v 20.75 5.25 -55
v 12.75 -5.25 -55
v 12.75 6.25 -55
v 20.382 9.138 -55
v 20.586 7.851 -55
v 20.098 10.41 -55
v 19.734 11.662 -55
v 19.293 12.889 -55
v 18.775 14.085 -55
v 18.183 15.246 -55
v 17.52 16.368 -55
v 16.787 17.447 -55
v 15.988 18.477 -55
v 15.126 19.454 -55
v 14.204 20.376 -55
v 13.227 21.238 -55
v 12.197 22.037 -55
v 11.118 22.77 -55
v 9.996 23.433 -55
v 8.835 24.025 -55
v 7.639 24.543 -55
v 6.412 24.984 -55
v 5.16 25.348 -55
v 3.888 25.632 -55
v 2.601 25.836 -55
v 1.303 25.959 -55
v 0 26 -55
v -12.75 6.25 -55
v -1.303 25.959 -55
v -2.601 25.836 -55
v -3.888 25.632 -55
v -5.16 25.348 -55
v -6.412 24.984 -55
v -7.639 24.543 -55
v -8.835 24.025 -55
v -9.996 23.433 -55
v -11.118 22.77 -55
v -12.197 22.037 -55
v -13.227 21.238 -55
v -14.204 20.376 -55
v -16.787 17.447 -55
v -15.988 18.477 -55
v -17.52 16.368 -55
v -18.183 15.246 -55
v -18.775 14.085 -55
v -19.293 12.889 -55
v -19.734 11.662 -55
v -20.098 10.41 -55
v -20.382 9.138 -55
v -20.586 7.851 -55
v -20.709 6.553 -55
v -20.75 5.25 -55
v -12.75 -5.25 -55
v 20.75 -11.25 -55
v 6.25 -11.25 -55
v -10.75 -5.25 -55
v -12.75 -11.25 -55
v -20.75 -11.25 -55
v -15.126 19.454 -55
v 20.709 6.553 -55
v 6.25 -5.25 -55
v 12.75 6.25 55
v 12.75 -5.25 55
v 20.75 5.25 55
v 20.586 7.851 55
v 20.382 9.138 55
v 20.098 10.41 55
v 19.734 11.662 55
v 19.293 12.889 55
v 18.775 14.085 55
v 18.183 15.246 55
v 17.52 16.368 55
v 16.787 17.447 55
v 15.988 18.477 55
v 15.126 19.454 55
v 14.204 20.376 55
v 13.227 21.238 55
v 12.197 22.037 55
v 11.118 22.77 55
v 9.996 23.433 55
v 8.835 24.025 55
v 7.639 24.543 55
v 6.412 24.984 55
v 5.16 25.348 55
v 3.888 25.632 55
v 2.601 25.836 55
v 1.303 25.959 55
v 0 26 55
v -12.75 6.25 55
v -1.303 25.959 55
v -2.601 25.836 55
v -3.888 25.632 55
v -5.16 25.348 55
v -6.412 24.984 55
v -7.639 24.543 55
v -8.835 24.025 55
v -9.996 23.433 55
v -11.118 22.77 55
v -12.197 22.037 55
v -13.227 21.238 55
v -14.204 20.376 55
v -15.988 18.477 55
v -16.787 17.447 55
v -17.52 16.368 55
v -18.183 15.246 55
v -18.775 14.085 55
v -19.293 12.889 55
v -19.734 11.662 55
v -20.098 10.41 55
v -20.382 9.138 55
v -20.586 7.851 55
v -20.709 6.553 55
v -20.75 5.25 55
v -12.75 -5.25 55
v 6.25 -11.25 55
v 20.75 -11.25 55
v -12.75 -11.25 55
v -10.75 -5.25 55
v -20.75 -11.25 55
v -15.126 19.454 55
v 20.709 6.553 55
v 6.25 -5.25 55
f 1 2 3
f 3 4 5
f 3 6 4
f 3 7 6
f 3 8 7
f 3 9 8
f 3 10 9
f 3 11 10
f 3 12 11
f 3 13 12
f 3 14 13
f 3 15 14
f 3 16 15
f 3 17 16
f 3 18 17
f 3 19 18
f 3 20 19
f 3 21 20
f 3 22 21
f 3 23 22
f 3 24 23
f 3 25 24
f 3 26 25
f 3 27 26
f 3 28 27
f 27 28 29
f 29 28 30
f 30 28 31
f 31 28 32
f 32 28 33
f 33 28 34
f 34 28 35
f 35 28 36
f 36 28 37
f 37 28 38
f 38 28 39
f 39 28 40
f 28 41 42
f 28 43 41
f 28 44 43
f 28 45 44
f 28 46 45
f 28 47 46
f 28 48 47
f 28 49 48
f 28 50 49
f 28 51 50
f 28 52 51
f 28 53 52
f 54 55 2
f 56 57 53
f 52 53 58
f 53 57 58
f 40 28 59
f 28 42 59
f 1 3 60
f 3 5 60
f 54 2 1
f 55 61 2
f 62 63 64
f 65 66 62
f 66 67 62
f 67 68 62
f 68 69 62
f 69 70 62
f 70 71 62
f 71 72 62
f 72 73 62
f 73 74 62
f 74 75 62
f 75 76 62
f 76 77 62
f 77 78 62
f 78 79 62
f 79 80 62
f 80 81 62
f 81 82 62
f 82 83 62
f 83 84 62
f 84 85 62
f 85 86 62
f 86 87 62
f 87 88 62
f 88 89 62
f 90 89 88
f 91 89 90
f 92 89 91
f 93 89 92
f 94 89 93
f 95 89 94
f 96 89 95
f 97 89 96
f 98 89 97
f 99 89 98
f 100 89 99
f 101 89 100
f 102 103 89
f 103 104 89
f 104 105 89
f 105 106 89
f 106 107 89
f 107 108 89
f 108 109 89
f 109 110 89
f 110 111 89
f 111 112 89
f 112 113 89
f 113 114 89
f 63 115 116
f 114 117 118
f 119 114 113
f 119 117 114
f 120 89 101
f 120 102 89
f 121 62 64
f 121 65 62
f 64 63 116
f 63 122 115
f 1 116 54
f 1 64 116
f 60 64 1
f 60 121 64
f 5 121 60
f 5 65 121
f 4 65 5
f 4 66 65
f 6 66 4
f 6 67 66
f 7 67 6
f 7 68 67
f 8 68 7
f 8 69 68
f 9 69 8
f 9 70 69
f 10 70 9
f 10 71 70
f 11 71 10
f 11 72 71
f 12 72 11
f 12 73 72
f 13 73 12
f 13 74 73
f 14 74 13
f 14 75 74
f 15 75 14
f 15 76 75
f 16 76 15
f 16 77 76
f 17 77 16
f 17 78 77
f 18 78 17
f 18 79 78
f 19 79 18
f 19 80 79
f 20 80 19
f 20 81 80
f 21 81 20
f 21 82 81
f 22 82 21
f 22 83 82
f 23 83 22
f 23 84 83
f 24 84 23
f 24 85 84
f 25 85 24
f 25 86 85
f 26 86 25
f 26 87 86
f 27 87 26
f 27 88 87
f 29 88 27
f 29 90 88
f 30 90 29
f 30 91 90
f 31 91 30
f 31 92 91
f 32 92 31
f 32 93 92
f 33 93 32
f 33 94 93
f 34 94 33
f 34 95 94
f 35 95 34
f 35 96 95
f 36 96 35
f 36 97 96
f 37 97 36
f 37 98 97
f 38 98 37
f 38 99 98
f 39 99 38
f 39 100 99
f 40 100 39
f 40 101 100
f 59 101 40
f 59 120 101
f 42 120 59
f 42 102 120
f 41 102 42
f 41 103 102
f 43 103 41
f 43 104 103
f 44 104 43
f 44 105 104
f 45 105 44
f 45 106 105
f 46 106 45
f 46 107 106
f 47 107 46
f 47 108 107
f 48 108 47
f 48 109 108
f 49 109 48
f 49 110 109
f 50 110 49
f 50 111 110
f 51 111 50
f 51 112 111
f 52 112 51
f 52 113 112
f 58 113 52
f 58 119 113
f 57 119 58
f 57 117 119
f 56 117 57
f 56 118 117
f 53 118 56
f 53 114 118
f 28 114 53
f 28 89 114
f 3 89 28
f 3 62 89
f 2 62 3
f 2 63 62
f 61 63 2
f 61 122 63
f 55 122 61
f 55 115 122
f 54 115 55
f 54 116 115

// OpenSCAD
// --- Pivot-Lock Pull-up Grip (V6: Ramped Snap & Refined Hook) ---
// All dimensions in millimeters (mm)

// --- 1. Bar Dimensions ---
bar_width = 25;
bar_height = 10;

// --- 2. Tuning & Fit ---
tolerance = 0.5;      // Printer clearance 

// --- 3. Grip Dimensions ---
grip_length = 110;    // 110mm for larger hands
wall_thickness = 8;   // Thick 8mm walls to handle body weight
lip_thickness = 6;    // Height/Thickness of the bottom hooks

// --- 4. Hook & Snap Dimensions ---
hook_reach = 6.5;     // Reduced slightly from 8mm for easier fitting
small_snap = 2;       // Size of the snap lip on the back

// Calculated inner dimensions
inner_w = bar_width + tolerance;
inner_h = bar_height + tolerance;
outer_w = inner_w + 2 * wall_thickness;

// Extrude the 2D profile into a 3D object
linear_extrude(height = grip_length, center = true)
grip_profile();

module grip_profile() {
    difference() {
        union() {
            // --- Core Body Construction ---
            difference() {
                union() {
                    // Rounded top
                    translate([0, inner_h/2]) 
                        circle(d=outer_w, $fn=100);
                    // Rectangular main body
                    translate([-outer_w/2, -inner_h/2]) 
                        square([outer_w, inner_h]);
                }
                // Wipeout block to guarantee a perfectly flat bottom before adding hooks
                translate([-outer_w, -inner_h/2 - outer_w]) 
                    square([outer_w*2, outer_w]);
            }
            
            // --- Left Lip (Small Snap with Lead-in Ramp) ---
            // The diagonal angle physically guides the metal bar inward to spread the plastic
            polygon(points=[
                [-outer_w/2, -inner_h/2],                           // Top Left
                [-inner_w/2 + small_snap, -inner_h/2],              // Top Right (Snap catch)
                [-inner_w/2, -inner_h/2 - lip_thickness],           // Bottom Right (Ramp start)
                [-outer_w/2, -inner_h/2 - lip_thickness]            // Bottom Left
            ]);
            
            // --- Right Lip (Large Front Hook) ---
            polygon(points=[
                [inner_w/2 - hook_reach, -inner_h/2],               // Top Left (Hook tip)
                [outer_w/2, -inner_h/2],                            // Top Right
                [outer_w/2, -inner_h/2 - lip_thickness],            // Bottom Right
                [inner_w/2 - hook_reach, -inner_h/2 - lip_thickness]// Bottom Left
            ]);
        }

        // --- Cutout for the 25x10 metal bar ---
        // Extends slightly upwards (+1) to ensure OpenSCAD cuts it cleanly
        translate([-inner_w/2, -inner_h/2])
            square([inner_w, inner_h + 1]);
    }
}
